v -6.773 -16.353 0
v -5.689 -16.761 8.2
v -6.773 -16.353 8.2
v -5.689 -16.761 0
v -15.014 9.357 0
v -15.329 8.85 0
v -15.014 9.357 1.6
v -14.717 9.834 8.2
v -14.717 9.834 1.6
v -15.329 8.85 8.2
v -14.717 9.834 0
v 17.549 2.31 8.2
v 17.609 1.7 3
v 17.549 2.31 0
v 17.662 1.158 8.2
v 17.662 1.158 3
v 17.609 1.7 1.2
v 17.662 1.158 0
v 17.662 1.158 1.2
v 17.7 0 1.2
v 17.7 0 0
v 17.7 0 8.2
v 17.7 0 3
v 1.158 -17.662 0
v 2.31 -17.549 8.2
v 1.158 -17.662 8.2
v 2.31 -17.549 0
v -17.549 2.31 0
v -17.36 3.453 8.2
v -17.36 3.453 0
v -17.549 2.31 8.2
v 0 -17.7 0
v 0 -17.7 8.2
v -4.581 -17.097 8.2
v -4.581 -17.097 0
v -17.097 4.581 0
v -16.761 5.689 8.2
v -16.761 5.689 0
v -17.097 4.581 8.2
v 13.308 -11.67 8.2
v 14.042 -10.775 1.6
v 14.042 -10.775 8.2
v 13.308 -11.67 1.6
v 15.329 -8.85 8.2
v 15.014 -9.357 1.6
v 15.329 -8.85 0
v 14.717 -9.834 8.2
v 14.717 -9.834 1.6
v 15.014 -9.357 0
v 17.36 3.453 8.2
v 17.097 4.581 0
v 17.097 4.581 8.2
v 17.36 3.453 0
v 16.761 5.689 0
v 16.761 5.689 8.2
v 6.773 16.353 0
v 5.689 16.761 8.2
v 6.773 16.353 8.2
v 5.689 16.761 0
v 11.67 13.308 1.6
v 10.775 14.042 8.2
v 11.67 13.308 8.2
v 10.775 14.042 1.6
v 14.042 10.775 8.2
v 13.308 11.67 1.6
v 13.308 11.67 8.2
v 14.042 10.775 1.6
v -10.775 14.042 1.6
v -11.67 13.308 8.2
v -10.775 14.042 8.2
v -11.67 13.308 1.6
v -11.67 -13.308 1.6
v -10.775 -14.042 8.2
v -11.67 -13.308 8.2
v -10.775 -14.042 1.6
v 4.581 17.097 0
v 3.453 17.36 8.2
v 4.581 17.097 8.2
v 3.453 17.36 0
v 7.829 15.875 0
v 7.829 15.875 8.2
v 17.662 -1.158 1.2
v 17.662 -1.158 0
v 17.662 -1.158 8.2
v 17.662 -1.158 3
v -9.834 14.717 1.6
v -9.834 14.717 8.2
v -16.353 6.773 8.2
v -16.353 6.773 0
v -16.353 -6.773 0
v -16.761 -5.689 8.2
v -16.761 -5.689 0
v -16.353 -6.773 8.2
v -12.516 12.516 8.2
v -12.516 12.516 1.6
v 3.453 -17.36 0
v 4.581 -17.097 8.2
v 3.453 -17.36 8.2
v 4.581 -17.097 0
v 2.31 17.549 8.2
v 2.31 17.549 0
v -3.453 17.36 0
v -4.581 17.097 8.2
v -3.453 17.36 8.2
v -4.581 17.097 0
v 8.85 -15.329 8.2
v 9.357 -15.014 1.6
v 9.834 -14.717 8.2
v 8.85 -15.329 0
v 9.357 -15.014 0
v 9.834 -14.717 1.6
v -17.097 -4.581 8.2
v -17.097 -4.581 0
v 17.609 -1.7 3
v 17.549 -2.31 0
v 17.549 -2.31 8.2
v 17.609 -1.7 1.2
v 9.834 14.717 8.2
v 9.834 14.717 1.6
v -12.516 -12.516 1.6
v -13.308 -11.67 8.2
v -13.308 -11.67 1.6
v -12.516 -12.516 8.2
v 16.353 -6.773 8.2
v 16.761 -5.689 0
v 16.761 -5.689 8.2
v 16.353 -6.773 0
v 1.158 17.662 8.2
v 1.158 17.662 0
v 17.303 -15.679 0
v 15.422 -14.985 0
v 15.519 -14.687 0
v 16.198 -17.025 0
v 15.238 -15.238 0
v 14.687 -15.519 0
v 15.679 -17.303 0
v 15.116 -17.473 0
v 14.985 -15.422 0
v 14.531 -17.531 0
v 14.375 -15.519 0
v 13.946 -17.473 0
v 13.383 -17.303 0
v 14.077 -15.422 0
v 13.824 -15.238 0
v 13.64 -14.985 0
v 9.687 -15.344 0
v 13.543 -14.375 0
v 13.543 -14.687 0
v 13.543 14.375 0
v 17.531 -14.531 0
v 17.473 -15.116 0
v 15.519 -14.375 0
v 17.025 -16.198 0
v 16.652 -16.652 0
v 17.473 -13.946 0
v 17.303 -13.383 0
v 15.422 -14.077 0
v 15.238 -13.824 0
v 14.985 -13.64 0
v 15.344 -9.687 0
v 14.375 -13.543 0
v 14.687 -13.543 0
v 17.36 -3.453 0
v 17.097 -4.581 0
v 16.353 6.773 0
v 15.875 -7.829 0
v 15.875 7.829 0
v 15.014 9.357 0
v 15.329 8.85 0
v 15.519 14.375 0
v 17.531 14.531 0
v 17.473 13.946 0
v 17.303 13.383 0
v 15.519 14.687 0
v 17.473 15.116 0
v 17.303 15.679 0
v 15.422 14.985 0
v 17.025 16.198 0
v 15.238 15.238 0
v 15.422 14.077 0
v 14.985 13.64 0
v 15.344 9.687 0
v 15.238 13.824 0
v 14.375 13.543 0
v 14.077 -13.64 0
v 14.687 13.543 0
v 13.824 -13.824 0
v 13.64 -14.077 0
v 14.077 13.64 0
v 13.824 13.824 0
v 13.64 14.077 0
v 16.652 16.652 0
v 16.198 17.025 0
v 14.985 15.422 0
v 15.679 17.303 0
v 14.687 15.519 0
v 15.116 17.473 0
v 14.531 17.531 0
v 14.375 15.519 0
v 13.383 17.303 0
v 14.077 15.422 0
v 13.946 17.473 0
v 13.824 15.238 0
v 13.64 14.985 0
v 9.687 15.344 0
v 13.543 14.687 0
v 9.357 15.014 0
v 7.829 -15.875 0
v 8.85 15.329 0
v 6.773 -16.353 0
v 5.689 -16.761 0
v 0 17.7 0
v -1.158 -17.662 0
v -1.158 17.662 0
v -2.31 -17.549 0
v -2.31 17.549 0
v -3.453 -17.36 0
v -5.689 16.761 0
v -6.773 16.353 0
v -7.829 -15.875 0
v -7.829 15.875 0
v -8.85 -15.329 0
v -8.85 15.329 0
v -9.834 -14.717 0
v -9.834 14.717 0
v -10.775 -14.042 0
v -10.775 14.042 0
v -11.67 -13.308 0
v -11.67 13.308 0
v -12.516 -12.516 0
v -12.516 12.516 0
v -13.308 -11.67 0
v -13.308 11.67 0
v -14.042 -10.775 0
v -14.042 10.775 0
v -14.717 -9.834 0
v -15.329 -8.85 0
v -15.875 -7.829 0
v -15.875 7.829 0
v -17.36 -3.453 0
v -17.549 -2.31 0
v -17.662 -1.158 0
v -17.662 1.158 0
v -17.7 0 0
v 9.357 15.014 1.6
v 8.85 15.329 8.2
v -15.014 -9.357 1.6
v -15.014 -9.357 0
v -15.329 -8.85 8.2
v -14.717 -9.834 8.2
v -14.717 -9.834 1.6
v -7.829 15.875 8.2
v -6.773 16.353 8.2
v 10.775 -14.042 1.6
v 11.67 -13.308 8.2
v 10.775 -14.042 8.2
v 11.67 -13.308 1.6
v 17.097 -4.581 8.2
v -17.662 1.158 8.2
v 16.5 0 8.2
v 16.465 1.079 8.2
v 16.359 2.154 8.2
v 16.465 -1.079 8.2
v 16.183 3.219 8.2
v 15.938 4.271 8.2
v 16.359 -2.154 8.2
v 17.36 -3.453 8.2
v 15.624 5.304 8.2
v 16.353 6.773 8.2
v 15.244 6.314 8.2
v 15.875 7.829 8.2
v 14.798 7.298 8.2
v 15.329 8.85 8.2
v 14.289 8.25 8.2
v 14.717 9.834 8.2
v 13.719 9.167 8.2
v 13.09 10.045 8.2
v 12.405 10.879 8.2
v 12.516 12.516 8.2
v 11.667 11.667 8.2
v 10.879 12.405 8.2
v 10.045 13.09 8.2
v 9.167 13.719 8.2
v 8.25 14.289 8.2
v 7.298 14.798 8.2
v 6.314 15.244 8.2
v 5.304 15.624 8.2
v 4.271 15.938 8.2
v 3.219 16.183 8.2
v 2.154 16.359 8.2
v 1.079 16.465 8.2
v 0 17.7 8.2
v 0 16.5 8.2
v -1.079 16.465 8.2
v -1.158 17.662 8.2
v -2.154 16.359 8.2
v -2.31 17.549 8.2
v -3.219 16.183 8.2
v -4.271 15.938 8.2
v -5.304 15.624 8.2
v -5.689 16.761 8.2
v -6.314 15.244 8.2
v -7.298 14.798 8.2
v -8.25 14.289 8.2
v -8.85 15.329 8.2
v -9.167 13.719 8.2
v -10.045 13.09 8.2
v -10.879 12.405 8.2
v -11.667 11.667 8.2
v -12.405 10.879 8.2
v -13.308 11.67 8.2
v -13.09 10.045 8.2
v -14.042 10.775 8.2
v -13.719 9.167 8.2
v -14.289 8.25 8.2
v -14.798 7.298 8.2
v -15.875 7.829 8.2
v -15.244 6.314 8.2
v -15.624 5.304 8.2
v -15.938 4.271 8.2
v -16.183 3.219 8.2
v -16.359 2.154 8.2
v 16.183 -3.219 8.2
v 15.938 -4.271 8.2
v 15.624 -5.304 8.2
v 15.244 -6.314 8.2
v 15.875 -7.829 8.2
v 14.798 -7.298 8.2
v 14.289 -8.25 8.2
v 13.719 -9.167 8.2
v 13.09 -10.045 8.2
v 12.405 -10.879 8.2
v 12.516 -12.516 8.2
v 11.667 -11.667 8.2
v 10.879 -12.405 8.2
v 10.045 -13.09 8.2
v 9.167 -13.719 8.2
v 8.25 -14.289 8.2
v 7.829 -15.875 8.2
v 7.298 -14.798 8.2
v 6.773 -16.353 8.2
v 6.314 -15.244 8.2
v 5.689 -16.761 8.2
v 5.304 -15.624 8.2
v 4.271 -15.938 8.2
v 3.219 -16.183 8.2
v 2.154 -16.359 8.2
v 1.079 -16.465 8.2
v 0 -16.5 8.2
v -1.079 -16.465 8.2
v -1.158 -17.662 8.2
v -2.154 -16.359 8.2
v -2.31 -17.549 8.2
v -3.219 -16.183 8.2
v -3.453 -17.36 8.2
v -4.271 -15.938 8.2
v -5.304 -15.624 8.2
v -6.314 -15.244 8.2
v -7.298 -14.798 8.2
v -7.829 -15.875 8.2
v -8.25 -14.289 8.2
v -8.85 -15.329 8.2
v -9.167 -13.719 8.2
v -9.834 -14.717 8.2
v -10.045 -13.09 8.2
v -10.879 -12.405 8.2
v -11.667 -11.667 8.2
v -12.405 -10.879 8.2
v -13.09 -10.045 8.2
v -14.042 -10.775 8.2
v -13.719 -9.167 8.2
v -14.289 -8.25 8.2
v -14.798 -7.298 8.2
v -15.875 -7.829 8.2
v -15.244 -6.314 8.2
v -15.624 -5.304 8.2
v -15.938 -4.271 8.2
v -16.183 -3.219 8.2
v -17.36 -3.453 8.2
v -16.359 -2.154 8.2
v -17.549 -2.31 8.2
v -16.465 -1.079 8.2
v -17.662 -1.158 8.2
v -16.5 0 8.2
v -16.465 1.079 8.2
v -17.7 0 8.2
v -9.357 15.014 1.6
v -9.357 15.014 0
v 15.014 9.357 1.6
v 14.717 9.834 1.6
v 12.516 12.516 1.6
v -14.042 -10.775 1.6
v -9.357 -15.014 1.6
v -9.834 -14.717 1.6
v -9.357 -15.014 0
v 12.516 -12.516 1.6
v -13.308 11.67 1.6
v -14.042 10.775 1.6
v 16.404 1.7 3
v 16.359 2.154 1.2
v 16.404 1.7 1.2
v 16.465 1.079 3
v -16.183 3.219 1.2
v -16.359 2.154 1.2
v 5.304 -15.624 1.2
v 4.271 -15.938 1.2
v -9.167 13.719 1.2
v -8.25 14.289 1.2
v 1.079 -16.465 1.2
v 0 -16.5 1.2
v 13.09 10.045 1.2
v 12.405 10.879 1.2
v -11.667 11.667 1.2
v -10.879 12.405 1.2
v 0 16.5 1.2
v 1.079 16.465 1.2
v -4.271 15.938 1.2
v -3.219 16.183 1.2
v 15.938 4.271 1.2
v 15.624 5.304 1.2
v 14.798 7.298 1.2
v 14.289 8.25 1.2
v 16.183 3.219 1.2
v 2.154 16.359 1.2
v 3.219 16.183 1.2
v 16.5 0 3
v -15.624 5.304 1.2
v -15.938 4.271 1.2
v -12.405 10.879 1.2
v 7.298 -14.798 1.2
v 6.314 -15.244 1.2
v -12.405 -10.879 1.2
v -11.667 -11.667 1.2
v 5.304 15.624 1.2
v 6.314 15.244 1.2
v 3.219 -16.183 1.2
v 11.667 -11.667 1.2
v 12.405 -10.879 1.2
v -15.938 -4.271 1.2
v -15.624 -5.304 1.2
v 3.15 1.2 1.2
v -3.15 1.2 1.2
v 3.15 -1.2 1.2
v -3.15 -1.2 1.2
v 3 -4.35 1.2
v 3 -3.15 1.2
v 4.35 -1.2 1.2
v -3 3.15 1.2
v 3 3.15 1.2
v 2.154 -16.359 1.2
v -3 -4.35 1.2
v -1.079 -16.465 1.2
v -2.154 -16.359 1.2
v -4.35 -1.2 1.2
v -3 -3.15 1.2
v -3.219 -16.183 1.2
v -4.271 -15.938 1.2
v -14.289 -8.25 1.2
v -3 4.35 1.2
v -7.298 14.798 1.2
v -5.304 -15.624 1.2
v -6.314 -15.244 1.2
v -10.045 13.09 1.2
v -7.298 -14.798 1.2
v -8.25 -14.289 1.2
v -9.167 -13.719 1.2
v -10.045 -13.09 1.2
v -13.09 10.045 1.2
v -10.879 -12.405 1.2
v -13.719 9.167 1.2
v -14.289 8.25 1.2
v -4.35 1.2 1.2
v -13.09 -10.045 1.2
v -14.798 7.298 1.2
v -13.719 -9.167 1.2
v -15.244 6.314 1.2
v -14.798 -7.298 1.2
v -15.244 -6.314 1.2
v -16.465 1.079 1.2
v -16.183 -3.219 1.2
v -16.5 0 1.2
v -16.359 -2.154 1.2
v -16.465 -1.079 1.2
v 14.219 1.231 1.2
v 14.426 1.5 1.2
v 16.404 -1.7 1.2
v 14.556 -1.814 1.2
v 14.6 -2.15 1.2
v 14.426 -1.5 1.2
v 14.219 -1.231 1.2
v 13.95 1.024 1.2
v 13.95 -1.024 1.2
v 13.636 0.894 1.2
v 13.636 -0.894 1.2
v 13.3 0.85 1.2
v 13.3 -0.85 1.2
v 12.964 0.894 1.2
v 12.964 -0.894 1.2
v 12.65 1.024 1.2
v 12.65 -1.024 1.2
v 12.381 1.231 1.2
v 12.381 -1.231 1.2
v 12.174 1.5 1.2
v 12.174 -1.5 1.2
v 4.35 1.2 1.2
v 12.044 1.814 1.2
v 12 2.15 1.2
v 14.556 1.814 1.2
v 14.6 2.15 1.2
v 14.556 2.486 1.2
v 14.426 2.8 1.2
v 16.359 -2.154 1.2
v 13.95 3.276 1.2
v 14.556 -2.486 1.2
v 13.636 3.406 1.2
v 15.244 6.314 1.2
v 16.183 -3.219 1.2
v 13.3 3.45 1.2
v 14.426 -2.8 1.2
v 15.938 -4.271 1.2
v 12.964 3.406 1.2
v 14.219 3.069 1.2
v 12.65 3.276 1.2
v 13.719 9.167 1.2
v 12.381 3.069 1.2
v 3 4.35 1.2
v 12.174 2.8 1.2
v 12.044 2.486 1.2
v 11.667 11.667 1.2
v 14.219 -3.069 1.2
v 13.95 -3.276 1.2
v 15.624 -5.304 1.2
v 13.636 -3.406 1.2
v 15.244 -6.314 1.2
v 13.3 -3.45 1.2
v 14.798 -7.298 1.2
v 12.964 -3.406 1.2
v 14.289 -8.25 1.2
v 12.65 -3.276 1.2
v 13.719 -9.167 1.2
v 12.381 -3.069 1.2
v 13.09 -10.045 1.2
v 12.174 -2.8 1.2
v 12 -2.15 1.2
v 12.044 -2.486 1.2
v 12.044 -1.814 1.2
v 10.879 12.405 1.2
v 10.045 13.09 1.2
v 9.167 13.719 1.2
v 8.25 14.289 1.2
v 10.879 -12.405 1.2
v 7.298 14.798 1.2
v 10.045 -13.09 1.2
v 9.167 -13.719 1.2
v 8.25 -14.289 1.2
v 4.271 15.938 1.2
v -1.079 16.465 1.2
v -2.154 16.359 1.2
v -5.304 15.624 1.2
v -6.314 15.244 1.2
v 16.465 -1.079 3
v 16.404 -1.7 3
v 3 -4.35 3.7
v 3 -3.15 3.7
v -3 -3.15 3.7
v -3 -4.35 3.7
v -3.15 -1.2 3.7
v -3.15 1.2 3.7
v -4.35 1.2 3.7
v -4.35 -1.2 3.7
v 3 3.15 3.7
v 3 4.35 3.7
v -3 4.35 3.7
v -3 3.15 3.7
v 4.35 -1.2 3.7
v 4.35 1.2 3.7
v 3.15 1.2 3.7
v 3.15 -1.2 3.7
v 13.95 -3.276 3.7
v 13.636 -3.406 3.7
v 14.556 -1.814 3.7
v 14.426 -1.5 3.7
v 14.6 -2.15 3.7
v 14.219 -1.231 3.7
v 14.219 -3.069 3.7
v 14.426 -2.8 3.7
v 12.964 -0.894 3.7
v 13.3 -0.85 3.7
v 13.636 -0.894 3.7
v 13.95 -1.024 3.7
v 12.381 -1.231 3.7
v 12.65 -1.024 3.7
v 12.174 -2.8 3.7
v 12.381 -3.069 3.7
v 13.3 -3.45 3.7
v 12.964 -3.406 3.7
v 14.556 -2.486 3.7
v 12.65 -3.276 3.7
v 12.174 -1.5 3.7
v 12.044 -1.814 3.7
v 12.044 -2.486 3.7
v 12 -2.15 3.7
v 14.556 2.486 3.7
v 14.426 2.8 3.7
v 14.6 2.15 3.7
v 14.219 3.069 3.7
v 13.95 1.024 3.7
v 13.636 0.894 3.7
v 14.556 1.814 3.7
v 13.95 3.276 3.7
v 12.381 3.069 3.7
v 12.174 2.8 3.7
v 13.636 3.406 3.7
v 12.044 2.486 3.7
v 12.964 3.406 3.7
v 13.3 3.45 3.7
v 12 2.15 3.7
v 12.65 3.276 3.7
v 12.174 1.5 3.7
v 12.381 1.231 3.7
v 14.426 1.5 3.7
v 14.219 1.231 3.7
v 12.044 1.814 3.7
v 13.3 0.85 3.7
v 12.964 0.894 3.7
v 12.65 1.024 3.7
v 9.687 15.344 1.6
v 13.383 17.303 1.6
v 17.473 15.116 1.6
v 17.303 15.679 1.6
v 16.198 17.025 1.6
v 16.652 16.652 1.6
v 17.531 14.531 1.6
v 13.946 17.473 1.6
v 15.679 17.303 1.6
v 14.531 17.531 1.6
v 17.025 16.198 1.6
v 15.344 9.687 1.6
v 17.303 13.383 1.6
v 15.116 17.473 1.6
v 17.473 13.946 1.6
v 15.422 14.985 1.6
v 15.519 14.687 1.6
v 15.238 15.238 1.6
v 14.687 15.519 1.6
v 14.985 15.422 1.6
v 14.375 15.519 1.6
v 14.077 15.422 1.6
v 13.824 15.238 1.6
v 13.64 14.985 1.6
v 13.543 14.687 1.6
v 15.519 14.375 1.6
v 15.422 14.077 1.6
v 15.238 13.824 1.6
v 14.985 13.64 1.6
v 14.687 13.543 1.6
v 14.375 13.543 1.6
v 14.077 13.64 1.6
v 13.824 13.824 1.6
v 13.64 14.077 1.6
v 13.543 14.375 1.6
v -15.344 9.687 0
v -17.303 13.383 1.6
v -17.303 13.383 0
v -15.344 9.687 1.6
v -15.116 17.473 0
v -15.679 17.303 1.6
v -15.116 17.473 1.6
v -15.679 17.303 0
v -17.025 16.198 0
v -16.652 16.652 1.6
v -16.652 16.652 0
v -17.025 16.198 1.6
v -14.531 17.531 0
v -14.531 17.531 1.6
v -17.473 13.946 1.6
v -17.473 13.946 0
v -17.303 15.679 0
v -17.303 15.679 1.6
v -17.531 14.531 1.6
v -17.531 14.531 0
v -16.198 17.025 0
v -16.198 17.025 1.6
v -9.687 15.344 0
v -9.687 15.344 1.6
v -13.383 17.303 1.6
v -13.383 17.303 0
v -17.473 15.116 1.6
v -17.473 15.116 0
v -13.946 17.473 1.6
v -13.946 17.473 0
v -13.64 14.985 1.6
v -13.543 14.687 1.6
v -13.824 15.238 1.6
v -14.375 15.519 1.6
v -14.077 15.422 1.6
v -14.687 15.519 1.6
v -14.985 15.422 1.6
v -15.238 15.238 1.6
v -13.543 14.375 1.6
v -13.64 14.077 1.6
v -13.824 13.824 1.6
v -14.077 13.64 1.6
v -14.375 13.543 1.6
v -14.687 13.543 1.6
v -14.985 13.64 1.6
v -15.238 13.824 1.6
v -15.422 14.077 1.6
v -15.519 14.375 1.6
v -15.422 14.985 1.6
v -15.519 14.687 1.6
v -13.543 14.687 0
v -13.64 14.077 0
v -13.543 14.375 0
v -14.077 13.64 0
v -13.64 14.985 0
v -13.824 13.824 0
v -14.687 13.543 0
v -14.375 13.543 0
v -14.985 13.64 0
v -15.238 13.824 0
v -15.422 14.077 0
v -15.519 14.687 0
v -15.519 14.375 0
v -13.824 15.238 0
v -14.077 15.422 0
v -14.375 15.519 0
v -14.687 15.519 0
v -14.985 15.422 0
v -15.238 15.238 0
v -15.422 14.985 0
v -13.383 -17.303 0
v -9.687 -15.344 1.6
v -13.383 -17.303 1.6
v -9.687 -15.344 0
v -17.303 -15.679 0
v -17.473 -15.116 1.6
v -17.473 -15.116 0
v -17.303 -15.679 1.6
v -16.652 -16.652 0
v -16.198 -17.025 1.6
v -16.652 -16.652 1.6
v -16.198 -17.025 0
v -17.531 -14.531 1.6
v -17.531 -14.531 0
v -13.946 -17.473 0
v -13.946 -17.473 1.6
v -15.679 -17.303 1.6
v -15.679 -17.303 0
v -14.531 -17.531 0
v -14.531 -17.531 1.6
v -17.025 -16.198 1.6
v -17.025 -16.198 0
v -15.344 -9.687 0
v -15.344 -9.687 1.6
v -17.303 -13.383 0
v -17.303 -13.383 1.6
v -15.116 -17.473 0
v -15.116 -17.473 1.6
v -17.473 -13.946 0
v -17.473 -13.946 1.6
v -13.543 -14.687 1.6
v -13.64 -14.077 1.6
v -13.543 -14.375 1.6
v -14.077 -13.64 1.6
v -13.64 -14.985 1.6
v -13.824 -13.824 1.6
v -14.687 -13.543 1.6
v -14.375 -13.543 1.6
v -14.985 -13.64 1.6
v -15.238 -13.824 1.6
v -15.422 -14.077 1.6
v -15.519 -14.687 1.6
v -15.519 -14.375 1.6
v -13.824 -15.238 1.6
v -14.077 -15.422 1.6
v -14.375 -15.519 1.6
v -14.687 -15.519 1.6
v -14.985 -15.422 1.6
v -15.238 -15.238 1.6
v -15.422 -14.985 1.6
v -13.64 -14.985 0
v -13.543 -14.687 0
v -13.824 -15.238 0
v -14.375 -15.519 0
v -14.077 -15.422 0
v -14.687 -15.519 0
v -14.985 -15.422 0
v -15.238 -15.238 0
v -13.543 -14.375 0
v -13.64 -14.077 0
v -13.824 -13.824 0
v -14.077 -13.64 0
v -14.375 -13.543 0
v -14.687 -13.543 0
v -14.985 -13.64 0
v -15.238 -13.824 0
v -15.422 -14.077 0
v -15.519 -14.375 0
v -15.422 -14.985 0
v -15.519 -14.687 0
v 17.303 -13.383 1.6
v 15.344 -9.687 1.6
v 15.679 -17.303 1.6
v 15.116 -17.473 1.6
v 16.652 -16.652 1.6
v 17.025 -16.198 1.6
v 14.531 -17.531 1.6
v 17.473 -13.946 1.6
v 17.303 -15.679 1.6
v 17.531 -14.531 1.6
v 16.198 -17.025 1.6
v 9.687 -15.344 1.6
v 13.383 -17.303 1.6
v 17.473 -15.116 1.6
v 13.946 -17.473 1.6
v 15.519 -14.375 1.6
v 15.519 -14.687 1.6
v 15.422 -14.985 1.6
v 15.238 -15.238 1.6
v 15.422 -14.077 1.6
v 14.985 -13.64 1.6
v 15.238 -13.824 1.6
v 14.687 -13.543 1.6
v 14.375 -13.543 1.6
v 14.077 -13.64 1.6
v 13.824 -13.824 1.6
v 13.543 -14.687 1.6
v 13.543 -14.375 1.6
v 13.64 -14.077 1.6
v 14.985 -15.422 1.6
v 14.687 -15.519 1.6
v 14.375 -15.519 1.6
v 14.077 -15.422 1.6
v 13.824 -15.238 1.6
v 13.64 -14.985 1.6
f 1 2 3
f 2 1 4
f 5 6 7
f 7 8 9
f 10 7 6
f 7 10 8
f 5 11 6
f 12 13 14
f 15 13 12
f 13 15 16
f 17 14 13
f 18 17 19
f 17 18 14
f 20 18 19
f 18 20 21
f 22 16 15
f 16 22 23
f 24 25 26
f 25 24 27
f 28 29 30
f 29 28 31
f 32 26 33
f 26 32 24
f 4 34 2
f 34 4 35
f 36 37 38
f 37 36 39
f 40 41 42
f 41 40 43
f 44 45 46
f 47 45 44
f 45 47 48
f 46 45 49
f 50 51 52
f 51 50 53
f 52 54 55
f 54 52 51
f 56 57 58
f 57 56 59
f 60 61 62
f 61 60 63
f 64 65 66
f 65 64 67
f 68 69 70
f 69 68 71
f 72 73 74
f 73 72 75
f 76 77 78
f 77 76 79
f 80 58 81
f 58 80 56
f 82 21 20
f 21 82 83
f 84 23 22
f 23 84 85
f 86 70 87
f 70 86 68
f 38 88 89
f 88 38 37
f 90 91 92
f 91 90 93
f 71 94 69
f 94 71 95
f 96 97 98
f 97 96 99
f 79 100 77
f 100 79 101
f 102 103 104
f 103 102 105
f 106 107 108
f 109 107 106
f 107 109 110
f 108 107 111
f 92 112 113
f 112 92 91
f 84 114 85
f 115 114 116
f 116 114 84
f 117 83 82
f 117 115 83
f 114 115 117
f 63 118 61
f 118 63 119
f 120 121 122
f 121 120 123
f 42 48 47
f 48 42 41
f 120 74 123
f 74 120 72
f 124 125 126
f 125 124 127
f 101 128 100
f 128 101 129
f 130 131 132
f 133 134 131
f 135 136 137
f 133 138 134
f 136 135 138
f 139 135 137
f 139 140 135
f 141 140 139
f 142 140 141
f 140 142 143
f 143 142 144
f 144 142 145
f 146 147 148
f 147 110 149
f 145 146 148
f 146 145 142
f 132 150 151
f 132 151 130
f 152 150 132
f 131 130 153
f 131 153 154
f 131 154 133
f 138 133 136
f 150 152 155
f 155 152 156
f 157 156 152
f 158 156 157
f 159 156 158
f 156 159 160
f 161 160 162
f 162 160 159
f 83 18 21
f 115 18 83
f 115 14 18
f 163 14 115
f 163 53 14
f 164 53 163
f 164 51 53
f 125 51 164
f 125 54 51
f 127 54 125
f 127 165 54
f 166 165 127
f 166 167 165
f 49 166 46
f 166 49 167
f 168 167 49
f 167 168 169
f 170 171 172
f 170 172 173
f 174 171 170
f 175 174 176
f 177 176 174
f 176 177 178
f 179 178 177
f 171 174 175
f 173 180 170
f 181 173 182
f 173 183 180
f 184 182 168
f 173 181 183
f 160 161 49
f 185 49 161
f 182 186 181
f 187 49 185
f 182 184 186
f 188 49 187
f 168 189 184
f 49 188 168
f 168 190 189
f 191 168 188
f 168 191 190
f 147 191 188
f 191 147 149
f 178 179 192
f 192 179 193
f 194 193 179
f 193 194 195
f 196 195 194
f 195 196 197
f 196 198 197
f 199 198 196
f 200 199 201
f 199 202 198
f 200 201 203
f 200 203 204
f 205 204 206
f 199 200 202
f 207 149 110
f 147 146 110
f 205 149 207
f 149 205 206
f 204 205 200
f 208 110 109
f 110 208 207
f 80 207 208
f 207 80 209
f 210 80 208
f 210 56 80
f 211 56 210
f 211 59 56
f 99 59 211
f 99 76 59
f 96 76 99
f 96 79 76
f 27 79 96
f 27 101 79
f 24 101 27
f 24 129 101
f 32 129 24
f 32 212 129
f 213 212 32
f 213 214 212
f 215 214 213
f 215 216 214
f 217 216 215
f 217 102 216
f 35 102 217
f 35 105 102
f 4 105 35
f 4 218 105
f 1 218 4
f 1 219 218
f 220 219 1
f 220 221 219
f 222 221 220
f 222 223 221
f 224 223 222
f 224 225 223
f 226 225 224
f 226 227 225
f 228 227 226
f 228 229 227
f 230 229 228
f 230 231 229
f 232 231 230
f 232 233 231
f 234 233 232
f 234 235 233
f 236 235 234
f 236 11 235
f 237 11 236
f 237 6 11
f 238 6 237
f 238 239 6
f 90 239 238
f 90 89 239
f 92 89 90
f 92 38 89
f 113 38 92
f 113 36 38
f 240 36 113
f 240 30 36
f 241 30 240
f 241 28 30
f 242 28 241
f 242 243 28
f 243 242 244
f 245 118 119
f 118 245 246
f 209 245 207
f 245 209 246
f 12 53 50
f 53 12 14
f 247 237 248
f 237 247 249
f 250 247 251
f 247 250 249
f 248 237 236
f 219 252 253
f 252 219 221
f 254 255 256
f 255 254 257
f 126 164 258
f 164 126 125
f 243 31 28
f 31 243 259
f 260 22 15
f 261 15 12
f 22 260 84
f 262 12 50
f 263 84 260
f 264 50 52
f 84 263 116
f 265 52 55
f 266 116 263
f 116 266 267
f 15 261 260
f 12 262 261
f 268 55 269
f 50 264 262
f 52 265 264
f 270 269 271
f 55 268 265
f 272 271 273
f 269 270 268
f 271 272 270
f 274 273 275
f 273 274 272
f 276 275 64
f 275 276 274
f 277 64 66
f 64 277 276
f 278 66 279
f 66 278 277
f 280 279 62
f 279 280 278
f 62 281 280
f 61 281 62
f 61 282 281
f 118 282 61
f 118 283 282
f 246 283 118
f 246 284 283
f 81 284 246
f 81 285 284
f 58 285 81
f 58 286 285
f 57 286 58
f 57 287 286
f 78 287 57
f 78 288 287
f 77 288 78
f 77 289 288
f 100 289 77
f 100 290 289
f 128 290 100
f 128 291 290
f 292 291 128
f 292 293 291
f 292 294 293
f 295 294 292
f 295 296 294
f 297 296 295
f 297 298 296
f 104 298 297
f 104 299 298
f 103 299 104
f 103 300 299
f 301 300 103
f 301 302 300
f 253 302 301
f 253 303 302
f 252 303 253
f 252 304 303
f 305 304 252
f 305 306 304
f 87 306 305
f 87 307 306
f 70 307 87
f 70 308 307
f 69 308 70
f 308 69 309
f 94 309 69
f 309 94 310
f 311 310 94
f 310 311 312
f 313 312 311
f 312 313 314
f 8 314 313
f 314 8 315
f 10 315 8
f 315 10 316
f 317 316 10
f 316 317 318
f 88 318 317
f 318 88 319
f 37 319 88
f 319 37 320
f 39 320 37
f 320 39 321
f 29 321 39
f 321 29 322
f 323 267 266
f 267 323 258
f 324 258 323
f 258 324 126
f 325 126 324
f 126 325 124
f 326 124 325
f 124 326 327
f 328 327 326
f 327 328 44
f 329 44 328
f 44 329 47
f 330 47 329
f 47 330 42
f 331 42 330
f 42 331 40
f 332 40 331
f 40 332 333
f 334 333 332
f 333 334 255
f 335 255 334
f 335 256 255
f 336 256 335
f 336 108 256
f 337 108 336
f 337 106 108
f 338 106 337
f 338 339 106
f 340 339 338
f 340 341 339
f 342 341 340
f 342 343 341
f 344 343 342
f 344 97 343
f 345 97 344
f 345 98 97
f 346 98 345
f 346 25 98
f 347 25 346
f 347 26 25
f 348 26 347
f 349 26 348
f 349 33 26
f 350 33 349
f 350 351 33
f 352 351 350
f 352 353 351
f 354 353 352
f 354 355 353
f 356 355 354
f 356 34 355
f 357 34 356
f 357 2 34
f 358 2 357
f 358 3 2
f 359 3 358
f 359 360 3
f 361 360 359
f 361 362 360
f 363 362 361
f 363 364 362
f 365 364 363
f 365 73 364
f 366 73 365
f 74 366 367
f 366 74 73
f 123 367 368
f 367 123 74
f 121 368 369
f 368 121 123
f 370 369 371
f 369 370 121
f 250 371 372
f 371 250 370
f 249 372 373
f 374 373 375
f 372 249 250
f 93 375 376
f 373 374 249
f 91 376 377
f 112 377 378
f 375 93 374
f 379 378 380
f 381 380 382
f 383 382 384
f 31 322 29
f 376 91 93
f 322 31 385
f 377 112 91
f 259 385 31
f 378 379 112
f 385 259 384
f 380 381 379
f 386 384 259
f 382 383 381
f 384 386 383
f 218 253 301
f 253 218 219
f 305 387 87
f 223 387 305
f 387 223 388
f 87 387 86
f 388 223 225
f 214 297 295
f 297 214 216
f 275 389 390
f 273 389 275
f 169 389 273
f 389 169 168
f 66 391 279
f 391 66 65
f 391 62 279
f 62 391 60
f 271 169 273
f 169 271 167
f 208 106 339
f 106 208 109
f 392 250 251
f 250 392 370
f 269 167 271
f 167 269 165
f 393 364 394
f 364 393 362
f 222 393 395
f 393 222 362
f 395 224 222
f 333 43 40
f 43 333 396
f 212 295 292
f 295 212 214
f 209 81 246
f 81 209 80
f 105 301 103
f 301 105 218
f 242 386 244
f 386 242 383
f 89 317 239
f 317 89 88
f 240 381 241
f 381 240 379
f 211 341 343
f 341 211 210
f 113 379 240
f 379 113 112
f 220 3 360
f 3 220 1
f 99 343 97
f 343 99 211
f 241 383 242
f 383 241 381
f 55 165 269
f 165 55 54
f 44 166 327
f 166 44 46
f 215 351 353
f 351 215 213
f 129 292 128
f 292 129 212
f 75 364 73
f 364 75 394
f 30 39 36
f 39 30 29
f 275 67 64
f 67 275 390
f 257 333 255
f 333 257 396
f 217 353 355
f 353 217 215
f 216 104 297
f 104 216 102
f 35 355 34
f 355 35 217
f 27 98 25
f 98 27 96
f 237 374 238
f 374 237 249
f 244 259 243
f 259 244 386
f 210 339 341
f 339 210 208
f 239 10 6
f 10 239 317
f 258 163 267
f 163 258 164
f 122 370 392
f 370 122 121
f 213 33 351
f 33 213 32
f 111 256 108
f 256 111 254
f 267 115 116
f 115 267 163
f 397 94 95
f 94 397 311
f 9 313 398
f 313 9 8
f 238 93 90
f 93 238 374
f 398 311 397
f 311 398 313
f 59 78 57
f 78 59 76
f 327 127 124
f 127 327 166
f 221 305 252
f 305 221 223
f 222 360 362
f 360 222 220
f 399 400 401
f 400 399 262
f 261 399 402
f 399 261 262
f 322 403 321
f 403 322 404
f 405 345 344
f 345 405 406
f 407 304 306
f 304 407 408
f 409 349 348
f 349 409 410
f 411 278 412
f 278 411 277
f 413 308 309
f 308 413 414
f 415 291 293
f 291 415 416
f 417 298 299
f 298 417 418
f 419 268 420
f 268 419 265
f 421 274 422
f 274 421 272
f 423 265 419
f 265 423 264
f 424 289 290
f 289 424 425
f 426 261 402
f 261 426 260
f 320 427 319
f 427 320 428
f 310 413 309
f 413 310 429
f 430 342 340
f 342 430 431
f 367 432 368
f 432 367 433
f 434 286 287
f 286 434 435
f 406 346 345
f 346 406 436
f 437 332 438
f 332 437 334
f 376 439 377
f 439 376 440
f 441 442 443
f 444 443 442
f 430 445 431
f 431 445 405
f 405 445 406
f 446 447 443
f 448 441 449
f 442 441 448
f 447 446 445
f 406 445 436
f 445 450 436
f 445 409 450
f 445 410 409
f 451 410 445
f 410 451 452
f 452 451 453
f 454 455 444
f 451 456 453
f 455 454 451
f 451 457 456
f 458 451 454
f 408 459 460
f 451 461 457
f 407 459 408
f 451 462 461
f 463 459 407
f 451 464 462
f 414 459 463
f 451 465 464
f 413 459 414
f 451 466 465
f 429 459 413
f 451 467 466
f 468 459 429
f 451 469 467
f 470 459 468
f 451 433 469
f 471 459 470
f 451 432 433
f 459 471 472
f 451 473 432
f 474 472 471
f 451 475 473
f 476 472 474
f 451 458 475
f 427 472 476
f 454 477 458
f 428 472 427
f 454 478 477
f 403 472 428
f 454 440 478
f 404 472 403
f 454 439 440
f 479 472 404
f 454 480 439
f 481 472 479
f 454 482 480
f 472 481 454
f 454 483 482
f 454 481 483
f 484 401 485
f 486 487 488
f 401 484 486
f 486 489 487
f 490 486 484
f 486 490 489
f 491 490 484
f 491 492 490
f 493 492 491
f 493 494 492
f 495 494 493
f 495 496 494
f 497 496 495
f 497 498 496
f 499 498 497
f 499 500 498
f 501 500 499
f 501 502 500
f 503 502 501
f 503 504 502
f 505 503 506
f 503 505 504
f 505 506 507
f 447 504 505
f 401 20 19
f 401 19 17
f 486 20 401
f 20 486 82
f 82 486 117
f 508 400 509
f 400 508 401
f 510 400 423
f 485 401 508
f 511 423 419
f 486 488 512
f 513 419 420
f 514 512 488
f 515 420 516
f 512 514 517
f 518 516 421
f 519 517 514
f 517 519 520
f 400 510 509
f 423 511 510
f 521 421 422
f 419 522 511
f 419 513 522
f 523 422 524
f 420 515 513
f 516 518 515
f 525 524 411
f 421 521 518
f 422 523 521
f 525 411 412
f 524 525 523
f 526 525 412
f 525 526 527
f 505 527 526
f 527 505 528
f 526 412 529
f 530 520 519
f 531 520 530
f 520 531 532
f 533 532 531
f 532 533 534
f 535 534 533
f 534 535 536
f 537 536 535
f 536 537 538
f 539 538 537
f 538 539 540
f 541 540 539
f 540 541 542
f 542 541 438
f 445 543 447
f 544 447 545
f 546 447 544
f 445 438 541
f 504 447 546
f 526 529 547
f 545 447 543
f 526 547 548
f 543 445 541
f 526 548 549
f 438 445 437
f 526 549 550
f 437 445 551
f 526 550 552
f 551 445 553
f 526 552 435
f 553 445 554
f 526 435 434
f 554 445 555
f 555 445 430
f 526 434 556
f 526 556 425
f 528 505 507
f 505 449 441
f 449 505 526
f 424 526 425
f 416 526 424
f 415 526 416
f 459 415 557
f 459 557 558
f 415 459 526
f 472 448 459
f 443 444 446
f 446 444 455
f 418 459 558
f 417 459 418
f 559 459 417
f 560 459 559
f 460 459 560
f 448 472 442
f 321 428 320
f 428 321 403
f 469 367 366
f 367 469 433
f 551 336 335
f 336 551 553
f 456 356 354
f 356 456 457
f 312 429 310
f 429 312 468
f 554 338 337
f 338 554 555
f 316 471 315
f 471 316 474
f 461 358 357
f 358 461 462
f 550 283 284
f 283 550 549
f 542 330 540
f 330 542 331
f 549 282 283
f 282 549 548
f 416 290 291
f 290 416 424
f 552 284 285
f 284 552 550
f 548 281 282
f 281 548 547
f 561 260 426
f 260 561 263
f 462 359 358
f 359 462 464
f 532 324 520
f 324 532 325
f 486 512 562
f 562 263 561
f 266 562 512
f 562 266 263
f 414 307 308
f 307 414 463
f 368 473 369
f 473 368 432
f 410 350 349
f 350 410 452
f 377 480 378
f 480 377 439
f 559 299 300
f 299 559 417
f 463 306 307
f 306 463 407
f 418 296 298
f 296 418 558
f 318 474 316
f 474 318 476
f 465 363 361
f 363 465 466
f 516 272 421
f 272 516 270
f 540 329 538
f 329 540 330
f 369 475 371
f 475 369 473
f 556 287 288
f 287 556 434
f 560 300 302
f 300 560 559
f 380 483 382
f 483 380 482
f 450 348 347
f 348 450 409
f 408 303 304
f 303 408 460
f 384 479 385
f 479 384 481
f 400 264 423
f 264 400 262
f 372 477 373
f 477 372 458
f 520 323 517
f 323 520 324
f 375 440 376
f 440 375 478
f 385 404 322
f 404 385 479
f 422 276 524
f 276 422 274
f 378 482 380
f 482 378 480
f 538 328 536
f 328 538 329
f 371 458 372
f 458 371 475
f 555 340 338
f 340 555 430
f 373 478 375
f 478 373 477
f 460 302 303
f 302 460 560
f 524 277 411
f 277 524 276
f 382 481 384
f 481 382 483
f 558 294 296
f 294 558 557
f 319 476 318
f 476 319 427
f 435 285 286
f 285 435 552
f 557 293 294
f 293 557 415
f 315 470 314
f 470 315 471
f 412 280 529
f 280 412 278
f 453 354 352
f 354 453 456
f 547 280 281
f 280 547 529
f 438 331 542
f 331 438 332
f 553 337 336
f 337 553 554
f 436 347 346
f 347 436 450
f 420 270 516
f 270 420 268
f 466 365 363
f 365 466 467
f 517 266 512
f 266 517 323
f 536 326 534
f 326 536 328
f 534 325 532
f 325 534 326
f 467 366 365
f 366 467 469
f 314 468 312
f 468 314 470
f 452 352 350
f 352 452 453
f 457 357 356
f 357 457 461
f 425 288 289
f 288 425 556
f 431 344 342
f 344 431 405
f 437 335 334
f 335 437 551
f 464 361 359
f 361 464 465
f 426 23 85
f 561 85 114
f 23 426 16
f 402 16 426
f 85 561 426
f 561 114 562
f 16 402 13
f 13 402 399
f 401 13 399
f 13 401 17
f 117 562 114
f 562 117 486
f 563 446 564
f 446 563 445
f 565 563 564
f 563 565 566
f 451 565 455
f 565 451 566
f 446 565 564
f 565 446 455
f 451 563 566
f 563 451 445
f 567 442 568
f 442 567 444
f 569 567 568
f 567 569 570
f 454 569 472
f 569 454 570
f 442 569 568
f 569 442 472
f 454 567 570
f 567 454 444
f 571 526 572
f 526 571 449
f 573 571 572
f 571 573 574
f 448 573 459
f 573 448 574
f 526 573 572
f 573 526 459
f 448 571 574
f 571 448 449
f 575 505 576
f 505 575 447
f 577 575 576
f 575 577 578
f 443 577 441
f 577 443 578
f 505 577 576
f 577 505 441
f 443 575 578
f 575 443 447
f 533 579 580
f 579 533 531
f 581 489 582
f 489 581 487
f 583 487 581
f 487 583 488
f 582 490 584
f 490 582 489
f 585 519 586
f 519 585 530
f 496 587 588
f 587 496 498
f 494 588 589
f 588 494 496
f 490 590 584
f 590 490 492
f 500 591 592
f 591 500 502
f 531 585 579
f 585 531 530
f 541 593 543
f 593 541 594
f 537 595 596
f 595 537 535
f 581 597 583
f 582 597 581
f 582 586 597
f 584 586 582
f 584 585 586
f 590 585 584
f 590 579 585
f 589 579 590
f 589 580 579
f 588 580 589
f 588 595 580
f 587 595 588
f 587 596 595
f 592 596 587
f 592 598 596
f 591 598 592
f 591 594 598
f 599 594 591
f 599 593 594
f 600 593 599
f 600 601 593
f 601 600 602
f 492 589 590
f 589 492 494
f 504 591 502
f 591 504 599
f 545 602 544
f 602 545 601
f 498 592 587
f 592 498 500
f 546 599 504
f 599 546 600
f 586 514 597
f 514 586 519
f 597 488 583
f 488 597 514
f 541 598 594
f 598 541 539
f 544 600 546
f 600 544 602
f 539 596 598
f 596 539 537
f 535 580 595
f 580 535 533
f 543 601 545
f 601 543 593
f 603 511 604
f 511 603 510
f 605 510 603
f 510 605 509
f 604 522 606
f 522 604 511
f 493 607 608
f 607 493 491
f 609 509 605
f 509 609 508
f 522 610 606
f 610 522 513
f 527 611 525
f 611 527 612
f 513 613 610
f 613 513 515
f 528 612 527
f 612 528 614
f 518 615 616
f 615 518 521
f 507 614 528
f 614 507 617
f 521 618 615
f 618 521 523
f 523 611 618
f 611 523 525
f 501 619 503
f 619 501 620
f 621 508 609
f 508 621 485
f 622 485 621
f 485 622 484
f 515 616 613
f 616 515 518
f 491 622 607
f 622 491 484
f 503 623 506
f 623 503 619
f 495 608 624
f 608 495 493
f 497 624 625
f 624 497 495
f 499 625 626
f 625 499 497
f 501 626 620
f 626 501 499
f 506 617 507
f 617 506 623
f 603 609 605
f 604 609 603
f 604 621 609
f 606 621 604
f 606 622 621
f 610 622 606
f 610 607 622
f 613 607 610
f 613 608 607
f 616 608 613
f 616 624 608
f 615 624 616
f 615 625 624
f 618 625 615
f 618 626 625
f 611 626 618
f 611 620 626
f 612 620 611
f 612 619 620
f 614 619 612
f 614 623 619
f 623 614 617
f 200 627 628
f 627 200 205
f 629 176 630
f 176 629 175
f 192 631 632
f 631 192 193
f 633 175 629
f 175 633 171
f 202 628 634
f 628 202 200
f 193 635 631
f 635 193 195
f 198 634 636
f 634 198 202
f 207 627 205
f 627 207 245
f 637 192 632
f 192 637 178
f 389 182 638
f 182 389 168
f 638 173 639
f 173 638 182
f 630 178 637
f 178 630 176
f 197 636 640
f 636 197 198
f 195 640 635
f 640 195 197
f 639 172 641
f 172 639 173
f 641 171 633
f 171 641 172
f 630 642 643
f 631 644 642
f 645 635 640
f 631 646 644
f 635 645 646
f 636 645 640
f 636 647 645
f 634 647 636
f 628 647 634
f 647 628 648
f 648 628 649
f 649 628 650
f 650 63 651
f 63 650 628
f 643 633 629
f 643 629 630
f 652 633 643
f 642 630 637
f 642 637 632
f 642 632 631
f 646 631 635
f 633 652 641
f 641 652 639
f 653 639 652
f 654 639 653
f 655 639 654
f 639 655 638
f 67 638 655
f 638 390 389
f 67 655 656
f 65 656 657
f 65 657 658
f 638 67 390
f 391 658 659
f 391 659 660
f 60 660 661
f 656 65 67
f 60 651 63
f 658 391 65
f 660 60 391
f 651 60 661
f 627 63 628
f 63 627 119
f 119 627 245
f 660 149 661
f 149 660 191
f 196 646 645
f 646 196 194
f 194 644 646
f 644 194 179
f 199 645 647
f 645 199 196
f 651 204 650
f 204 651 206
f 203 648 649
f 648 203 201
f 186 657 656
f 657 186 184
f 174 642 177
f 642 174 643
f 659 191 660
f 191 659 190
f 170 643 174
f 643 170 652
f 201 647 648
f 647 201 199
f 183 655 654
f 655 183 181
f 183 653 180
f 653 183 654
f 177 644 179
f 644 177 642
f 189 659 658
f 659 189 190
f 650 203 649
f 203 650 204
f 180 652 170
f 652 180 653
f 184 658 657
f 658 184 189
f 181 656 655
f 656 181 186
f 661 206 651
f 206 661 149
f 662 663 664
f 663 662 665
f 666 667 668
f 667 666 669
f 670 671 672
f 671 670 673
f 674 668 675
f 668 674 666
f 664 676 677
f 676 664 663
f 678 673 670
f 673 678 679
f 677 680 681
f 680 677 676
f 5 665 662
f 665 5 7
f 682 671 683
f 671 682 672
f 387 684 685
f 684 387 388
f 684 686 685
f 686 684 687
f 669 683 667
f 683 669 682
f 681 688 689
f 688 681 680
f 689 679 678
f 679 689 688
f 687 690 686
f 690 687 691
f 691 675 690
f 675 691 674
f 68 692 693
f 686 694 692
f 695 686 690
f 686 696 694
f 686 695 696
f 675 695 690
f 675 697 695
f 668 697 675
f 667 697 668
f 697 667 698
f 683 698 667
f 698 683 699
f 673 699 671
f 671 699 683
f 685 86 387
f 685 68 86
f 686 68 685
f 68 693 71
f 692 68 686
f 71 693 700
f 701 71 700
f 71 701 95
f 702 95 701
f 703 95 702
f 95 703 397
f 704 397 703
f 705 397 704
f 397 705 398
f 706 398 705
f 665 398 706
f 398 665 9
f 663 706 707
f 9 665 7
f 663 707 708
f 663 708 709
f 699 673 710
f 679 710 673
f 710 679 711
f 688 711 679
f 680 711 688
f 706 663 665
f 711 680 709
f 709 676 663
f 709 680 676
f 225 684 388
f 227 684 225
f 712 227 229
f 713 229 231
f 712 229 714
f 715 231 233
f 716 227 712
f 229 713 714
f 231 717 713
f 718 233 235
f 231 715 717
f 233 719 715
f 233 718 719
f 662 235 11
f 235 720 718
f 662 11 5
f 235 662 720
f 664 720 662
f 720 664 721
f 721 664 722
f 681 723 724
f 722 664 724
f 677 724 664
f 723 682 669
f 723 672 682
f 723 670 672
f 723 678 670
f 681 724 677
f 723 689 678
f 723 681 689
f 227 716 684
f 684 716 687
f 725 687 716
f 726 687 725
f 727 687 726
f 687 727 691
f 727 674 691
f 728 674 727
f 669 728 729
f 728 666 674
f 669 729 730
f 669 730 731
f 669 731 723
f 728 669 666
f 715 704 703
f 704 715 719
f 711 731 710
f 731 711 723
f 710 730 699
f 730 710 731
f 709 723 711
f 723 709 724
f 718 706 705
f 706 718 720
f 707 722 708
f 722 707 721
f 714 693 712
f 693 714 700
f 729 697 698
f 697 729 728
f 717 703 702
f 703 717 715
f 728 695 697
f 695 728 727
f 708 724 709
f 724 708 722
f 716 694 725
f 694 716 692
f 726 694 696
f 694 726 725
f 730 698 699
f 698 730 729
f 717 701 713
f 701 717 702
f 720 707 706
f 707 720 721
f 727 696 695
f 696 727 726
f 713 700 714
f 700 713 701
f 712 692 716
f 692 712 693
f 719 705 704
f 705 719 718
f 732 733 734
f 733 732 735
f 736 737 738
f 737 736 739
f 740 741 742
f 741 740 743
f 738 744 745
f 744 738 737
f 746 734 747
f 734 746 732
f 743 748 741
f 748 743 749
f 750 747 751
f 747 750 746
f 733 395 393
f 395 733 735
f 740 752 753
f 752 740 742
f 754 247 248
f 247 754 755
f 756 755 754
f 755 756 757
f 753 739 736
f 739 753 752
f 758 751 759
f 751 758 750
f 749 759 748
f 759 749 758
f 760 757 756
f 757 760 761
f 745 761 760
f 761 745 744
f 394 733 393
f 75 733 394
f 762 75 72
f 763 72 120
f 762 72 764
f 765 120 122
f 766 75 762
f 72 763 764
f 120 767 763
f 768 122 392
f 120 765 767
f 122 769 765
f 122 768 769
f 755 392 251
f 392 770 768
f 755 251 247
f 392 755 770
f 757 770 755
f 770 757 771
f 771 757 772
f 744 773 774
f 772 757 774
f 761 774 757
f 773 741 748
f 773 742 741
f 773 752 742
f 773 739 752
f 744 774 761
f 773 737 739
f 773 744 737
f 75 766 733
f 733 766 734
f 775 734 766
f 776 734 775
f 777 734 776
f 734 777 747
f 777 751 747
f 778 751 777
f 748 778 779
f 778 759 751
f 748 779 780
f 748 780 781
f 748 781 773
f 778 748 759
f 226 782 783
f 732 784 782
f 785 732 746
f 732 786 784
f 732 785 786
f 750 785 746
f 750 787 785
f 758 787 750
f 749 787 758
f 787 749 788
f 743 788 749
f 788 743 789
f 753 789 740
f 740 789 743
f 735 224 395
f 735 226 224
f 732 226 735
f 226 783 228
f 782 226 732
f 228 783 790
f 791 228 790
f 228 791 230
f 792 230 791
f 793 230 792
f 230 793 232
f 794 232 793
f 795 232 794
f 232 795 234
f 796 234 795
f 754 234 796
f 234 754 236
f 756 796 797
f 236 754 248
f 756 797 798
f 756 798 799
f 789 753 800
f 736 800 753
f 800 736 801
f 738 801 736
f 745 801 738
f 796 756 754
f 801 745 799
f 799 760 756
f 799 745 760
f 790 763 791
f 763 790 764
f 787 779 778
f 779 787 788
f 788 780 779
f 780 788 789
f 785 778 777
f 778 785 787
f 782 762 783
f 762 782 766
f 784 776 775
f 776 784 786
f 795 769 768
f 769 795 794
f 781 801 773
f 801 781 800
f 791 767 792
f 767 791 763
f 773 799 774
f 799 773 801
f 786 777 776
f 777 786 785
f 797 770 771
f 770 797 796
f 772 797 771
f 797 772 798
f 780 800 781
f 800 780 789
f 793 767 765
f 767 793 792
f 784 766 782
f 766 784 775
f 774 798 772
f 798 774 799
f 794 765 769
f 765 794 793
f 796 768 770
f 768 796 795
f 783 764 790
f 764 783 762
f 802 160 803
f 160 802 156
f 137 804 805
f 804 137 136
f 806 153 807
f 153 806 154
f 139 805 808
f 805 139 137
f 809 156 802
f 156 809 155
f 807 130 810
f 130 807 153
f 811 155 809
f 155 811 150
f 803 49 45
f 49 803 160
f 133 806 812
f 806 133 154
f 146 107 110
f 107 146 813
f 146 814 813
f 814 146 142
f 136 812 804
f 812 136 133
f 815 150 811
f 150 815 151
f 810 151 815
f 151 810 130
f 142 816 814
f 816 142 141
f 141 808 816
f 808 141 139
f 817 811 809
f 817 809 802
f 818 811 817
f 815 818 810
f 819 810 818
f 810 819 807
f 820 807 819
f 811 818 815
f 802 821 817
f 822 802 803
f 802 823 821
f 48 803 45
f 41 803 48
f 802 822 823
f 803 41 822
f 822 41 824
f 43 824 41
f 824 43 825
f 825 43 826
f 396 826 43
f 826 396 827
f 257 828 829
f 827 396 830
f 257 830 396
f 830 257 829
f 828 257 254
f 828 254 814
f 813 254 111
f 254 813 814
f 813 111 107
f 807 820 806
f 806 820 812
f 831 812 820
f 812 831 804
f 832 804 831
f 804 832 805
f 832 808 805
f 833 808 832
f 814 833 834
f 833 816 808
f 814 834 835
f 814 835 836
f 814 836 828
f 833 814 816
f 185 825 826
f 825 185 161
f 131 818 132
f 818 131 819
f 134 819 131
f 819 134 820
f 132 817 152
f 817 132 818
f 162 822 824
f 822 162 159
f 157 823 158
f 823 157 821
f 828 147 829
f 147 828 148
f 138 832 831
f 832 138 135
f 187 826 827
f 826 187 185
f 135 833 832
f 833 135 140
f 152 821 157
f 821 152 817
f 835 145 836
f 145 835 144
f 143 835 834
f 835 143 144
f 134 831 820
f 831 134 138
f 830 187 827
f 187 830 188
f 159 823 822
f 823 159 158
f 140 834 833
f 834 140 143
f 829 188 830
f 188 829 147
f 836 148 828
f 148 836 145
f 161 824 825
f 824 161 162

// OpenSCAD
// teddy-me: squeeze pad for the paw button.
//
// A small round pod that turns a 6 x 6 mm tactile switch into a button you can
// find through stuffing. Three printed parts:
//   base   holds the switch (legs bent out flat) and the two wires
//   plate  a loose disc that rests on the switch plunger. Press it anywhere:
//          in the middle it pushes straight down, at an edge it tips, catches
//          under the ring on the far side and levers the plunger down
//   ring   slips over the base and keeps the plate in. Glue it on
//
//   openscad -D 'part="base"' -o paw-pad-base.stl paw-pad.scad
//   (or just run ./build.sh)
//
// All three print flat on the bed with no supports.

/* [What to build] */
part  = "base";   // "base", "plate", "ring" (print orientation), or "assembly".
                  // Check poses, in place: "base_placed", "ring_placed", "switch",
                  // "plate_rest", "plate_pressed", "plate_lifted", "plate_edge"
cut   = false;    // "assembly": slice it open to show the inside

/* [Size] */
pad_d = 30;       // diameter of the plate you press

/* [Tactile switch]  MEASURE */
sw_side   = 6.0;  // body is square: side length
sw_body_h = 3.5;  // body height
sw_h      = 5.0;  // underside of the body to the top of the plunger. Common
                  // 6 mm switches are 4.3, 5, 7 or 9.5 mm: measure yours
sw_plunger_d = 3.5;
sw_travel = 0.35; // how far the plunger moves before it clicks (0.25 typical)

/* [Fits] */
lift      = 0.8;  // free play of the plate above the plunger. Generous on
                  // purpose: if it were too small a tall switch would be held down
proud     = 1.4;  // how far the plate stands above the ring
flange_over = 1.2;// plate flange beyond the plate
flange_t  = 1.2;
bore_clear= 0.3;  // plate flange to base wall, per side
top_clear = 0.4;  // plate to ring opening, per side
ring_clear= 0.15; // ring to base wall, per side (glued)
wall      = 1.2;  // base wall
ring_wall = 1.2;
lip_t     = 1.2;  // ring lip that holds the plate in
floor_t   = 1.2;
skirt_max = 5.0;  // how far the ring comes down the base wall

/* [Switch pocket and wires] */
rib_h     = 2.5;  // height of the ribs that locate the switch
rib_t     = 1.2;
sw_clear  = 0.15; // switch body to ribs, per side
slot      = [3.4, 1.8];  // wire exit in the wall: width, height (two 1.4 mm wires)
gate      = 1.7;  // gap between the two posts that pinch the wires

/* [Sewing tabs] */
tabs      = 4;    // number of tabs with a hole for a stitch (0 = none)
tab_len   = 4.5;  // how far each tab sticks out beyond the ring
tab_t     = 1.6;
tab_hole  = 2.0;

// =====================================================================
$fn = 96;
r_pad  = pad_d/2;
r_fl   = r_pad + flange_over;          // plate flange
r_in   = r_fl + bore_clear;            // inside of the base wall
r_base = r_in + wall;                  // outside of the base wall
r_ring = r_base + ring_clear + ring_wall;
wall_top = sw_h + flange_t + lift;     // top of the base wall = underside of the ring lip
plate_t  = flange_t + lift + lip_t + proud;
skirt  = min(skirt_max, wall_top - slot[1] - 0.4);   // never covers the wire exit
half   = sw_side/2 + sw_clear;
e      = 0.01;
assert(sw_h - rib_h >= sw_travel + 1.2 + 0.5, "ribs too tall for this switch");
if (part != "none")
    echo(str("PAW PAD plate ", pad_d, " mm; whole pod ", 2*r_ring, " mm across",
             tabs > 0 ? str(" (", 2*(r_ring + tab_len), " over the tabs)") : "",
             ", ", floor_t + sw_h + plate_t, " mm tall"));

// z = 0 is the top of the base floor, where the switch sits.
module base() {
    difference() {
        translate([0, 0, -floor_t]) cylinder(r = r_base, h = floor_t + wall_top);
        cylinder(r = r_in, h = wall_top + 1);
        // wire exit, at +x
        translate([r_in - 1, -slot[0]/2, 0]) cube([wall + 2, slot[0], slot[1]]);
    }
    // switch pocket: the legs leave on the +x and -x sides, two per side
    for (s = [-1, 1]) {
        translate([-sw_side/2, s*(half + rib_t/2) - rib_t/2, -e]) cube([sw_side, rib_t, rib_h + e]);
        translate([s*(half + rib_t/2) - rib_t/2, -1.2, -e]) cube([rib_t, 2.4, rib_h + e]);
    }
    // two posts that pinch the wires before they leave
    for (s = [-1, 1]) translate([r_in - 3.2, s*(gate/2 + 1.3), -e]) cylinder(d = 2.6, h = rib_h + e, $fn = 24);
    // sewing tabs, between the wire exit and the next one round
    if (tabs > 0) for (i = [0 : tabs - 1]) rotate(360*(i + 0.5)/tabs) difference() {
        hull() {
            translate([r_ring + tab_len - 3, 0, -floor_t]) cylinder(r = 3, h = tab_t, $fn = 32);
            translate([r_base - 1, -4, -floor_t]) cube([1, 8, tab_t]);
        }
        translate([r_ring + tab_len - 3, 0, -floor_t - 1]) cylinder(d = tab_hole, h = tab_t + 2, $fn = 20);
    }
}

// the plate where it rests: underside on the plunger
module plate() {
    ch = 0.8;
    translate([0, 0, sw_h]) {
        cylinder(r = r_fl, h = flange_t);
        cylinder(r = r_pad, h = plate_t - ch);
        translate([0, 0, plate_t - ch]) cylinder(r1 = r_pad, r2 = r_pad - ch, h = ch);
    }
}

// the ring where it sits: lip on top of the base wall
module ring() {
    ch = 0.6;
    difference() {
        union() {
            translate([0, 0, wall_top - skirt]) cylinder(r = r_ring, h = skirt + lip_t - ch);
            translate([0, 0, wall_top + lip_t - ch]) cylinder(r1 = r_ring, r2 = r_ring - ch, h = ch);
        }
        translate([0, 0, wall_top - skirt - 1]) cylinder(r = r_base + ring_clear, h = skirt + 1);
        translate([0, 0, wall_top - 1]) cylinder(r = r_pad + top_clear, h = lip_t + 2);
    }
}

// block model of the switch with its legs bent out flat
module switch() {
    translate([-sw_side/2, -sw_side/2, 0]) cube([sw_side, sw_side, sw_body_h]);
    cylinder(d = sw_plunger_d, h = sw_h, $fn = 32);
    for (sx = [-1, 1], sy = [-1, 1])
        translate([sx > 0 ? sw_side/2 - e : -sw_side/2 - 3, sy*2.25 - 0.35, 0]) cube([3 + e, 0.7, 0.3]);
}

// the plate tipped by a press on its +x edge: first it tips about the plunger
// until the far edge catches under the ring, then about that edge until the
// plunger has gone down by `press`
module plate_edge(press = sw_travel + 0.15) {
    th1 = asin((lift - 0.05)/r_fl);
    th2 = atan(press/r_fl);
    B = [-r_fl*cos(th1), 0, sw_h + flange_t + lift - 0.05];
    translate(B) rotate([0, th2, 0]) translate(-B)
        translate([0, 0, sw_h]) rotate([0, th1, 0]) translate([0, 0, -sw_h]) plate();
}

if (part == "base")  translate([0, 0, floor_t]) base();
if (part == "plate") translate([0, 0, -sw_h]) plate();
if (part == "ring")  translate([0, 0, wall_top + lip_t]) rotate([180, 0, 0]) ring();
if (part == "base_placed")   base();
if (part == "ring_placed")   ring();
if (part == "switch")        switch();
if (part == "plate_rest")    plate();
if (part == "plate_pressed") translate([0, 0, -(sw_travel + 0.15)]) plate();
if (part == "plate_lifted")  translate([0, 0, lift - 0.02]) plate();
if (part == "plate_edge")    plate_edge();
if (part == "assembly") difference() {
    union() {
        color("#e7a23b") base();
        color("#f0b860") ring();
        color("#f6d9c9") plate();
        color("#2b2d33") switch();
    }
    if (cut) translate([-100, -200, -50]) cube([200, 200, 100]);
}
